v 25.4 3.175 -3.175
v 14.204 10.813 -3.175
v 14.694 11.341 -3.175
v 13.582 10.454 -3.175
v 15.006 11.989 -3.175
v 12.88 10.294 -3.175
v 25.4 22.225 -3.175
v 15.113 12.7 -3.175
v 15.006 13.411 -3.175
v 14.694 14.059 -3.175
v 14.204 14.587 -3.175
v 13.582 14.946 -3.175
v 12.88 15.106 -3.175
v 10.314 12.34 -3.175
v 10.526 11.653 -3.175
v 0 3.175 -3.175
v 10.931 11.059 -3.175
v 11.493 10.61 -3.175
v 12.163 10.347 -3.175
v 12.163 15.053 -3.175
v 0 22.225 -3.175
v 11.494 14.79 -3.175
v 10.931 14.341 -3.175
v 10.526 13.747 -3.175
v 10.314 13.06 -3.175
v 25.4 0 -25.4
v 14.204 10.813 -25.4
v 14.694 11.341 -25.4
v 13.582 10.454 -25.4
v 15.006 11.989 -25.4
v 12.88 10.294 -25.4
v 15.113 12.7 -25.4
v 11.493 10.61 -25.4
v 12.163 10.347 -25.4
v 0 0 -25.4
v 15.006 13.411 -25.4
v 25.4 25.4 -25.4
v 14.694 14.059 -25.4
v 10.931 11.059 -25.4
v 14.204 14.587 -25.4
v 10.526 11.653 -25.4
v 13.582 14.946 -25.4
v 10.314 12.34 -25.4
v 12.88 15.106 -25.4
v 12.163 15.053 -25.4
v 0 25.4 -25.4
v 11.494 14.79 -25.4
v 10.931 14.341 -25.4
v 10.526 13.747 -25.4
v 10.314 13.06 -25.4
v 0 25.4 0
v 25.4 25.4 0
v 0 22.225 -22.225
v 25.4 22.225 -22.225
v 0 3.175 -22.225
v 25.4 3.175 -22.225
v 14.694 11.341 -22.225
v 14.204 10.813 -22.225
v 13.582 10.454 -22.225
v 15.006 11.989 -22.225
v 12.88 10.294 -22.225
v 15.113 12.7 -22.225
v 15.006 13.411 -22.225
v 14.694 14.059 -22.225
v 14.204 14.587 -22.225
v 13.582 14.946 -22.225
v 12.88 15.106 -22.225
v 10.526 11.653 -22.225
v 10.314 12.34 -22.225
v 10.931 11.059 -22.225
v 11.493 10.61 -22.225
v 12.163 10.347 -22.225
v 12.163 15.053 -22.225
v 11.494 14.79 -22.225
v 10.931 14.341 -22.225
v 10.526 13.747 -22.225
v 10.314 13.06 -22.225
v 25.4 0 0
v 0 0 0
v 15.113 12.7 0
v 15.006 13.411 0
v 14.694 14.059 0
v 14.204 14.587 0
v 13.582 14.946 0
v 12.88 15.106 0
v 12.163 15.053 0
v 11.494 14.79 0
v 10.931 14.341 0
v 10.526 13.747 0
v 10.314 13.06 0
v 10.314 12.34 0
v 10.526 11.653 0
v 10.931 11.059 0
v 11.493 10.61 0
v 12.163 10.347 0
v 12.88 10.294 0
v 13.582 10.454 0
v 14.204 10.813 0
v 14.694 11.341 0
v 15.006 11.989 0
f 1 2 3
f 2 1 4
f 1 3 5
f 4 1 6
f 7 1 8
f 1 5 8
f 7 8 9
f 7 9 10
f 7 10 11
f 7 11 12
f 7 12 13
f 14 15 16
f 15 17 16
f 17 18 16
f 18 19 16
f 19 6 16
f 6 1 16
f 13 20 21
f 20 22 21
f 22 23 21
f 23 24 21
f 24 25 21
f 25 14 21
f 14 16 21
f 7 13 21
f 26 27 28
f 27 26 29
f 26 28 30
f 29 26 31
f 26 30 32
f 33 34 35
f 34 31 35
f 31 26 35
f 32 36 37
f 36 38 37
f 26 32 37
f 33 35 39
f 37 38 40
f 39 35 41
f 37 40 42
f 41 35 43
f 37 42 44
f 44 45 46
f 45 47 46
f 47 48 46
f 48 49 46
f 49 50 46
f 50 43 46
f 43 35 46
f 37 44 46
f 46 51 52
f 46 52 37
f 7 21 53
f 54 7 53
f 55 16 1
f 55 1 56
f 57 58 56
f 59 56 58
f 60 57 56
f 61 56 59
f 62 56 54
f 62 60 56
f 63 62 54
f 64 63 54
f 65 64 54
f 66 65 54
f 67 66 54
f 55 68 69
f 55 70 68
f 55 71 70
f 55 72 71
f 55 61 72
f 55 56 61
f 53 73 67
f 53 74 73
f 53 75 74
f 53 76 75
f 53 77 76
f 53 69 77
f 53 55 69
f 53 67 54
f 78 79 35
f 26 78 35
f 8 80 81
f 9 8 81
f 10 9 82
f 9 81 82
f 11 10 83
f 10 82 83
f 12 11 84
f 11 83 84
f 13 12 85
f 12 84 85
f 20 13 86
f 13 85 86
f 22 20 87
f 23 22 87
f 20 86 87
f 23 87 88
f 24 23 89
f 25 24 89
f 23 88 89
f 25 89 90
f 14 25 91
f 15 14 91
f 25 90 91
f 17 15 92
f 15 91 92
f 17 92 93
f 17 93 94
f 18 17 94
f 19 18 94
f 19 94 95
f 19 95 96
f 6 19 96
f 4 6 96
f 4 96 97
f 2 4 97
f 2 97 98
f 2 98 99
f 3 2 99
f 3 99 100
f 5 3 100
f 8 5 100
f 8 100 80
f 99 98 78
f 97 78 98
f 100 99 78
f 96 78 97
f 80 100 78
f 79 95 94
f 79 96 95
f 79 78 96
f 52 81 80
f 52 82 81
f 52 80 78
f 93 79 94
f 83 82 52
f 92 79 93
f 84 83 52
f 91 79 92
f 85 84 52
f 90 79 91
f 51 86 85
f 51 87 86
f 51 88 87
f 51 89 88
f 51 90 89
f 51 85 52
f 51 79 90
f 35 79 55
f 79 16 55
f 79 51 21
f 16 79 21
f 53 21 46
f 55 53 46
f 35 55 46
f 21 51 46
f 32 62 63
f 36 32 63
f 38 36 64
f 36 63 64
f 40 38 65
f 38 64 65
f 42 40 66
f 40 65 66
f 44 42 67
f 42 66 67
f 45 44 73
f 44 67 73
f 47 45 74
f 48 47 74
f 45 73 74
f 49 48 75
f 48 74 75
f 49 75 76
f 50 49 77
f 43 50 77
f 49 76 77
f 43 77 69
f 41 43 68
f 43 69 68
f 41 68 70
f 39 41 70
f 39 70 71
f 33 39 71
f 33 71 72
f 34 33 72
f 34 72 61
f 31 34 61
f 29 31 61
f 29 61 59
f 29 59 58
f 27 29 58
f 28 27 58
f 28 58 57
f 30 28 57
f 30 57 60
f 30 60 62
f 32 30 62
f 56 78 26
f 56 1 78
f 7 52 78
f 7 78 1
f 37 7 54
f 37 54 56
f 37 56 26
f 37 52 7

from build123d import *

# Parameters (mm, degrees)
SKETCH1_W           = 25.4
SKETCH1_H           = 25.4
SKETCH1_W_2         = 19.05
SKETCH1_H_2         = 19.05
EXTRUDE_THIN1_DEPTH = 25.4
SKETCH2_R           = 2.413
CUT_EXTRUDE1_DEPTH  = 26.4


with BuildPart() as part:
    # Sketch1 → Extrude-Thin1 (new body)
    with BuildSketch(Plane(origin=(0, 0, 0), x_dir=(0, 0, -1), z_dir=(1, 0, 0))):
        with Locations((12.7, 12.7)):
            Rectangle(SKETCH1_W, SKETCH1_H)
        with Locations((12.7, 12.7)):
            Rectangle(SKETCH1_W_2, SKETCH1_H_2, mode=Mode.SUBTRACT)
    extrude(amount=EXTRUDE_THIN1_DEPTH)

    # Sketch2 → Cut-Extrude1 (cut, through all)
    with BuildSketch(Plane.XY):
        with Locations((12.7, 12.7)):
            Circle(SKETCH2_R)
    extrude(amount=-CUT_EXTRUDE1_DEPTH, mode=Mode.SUBTRACT)


solid = part.part
